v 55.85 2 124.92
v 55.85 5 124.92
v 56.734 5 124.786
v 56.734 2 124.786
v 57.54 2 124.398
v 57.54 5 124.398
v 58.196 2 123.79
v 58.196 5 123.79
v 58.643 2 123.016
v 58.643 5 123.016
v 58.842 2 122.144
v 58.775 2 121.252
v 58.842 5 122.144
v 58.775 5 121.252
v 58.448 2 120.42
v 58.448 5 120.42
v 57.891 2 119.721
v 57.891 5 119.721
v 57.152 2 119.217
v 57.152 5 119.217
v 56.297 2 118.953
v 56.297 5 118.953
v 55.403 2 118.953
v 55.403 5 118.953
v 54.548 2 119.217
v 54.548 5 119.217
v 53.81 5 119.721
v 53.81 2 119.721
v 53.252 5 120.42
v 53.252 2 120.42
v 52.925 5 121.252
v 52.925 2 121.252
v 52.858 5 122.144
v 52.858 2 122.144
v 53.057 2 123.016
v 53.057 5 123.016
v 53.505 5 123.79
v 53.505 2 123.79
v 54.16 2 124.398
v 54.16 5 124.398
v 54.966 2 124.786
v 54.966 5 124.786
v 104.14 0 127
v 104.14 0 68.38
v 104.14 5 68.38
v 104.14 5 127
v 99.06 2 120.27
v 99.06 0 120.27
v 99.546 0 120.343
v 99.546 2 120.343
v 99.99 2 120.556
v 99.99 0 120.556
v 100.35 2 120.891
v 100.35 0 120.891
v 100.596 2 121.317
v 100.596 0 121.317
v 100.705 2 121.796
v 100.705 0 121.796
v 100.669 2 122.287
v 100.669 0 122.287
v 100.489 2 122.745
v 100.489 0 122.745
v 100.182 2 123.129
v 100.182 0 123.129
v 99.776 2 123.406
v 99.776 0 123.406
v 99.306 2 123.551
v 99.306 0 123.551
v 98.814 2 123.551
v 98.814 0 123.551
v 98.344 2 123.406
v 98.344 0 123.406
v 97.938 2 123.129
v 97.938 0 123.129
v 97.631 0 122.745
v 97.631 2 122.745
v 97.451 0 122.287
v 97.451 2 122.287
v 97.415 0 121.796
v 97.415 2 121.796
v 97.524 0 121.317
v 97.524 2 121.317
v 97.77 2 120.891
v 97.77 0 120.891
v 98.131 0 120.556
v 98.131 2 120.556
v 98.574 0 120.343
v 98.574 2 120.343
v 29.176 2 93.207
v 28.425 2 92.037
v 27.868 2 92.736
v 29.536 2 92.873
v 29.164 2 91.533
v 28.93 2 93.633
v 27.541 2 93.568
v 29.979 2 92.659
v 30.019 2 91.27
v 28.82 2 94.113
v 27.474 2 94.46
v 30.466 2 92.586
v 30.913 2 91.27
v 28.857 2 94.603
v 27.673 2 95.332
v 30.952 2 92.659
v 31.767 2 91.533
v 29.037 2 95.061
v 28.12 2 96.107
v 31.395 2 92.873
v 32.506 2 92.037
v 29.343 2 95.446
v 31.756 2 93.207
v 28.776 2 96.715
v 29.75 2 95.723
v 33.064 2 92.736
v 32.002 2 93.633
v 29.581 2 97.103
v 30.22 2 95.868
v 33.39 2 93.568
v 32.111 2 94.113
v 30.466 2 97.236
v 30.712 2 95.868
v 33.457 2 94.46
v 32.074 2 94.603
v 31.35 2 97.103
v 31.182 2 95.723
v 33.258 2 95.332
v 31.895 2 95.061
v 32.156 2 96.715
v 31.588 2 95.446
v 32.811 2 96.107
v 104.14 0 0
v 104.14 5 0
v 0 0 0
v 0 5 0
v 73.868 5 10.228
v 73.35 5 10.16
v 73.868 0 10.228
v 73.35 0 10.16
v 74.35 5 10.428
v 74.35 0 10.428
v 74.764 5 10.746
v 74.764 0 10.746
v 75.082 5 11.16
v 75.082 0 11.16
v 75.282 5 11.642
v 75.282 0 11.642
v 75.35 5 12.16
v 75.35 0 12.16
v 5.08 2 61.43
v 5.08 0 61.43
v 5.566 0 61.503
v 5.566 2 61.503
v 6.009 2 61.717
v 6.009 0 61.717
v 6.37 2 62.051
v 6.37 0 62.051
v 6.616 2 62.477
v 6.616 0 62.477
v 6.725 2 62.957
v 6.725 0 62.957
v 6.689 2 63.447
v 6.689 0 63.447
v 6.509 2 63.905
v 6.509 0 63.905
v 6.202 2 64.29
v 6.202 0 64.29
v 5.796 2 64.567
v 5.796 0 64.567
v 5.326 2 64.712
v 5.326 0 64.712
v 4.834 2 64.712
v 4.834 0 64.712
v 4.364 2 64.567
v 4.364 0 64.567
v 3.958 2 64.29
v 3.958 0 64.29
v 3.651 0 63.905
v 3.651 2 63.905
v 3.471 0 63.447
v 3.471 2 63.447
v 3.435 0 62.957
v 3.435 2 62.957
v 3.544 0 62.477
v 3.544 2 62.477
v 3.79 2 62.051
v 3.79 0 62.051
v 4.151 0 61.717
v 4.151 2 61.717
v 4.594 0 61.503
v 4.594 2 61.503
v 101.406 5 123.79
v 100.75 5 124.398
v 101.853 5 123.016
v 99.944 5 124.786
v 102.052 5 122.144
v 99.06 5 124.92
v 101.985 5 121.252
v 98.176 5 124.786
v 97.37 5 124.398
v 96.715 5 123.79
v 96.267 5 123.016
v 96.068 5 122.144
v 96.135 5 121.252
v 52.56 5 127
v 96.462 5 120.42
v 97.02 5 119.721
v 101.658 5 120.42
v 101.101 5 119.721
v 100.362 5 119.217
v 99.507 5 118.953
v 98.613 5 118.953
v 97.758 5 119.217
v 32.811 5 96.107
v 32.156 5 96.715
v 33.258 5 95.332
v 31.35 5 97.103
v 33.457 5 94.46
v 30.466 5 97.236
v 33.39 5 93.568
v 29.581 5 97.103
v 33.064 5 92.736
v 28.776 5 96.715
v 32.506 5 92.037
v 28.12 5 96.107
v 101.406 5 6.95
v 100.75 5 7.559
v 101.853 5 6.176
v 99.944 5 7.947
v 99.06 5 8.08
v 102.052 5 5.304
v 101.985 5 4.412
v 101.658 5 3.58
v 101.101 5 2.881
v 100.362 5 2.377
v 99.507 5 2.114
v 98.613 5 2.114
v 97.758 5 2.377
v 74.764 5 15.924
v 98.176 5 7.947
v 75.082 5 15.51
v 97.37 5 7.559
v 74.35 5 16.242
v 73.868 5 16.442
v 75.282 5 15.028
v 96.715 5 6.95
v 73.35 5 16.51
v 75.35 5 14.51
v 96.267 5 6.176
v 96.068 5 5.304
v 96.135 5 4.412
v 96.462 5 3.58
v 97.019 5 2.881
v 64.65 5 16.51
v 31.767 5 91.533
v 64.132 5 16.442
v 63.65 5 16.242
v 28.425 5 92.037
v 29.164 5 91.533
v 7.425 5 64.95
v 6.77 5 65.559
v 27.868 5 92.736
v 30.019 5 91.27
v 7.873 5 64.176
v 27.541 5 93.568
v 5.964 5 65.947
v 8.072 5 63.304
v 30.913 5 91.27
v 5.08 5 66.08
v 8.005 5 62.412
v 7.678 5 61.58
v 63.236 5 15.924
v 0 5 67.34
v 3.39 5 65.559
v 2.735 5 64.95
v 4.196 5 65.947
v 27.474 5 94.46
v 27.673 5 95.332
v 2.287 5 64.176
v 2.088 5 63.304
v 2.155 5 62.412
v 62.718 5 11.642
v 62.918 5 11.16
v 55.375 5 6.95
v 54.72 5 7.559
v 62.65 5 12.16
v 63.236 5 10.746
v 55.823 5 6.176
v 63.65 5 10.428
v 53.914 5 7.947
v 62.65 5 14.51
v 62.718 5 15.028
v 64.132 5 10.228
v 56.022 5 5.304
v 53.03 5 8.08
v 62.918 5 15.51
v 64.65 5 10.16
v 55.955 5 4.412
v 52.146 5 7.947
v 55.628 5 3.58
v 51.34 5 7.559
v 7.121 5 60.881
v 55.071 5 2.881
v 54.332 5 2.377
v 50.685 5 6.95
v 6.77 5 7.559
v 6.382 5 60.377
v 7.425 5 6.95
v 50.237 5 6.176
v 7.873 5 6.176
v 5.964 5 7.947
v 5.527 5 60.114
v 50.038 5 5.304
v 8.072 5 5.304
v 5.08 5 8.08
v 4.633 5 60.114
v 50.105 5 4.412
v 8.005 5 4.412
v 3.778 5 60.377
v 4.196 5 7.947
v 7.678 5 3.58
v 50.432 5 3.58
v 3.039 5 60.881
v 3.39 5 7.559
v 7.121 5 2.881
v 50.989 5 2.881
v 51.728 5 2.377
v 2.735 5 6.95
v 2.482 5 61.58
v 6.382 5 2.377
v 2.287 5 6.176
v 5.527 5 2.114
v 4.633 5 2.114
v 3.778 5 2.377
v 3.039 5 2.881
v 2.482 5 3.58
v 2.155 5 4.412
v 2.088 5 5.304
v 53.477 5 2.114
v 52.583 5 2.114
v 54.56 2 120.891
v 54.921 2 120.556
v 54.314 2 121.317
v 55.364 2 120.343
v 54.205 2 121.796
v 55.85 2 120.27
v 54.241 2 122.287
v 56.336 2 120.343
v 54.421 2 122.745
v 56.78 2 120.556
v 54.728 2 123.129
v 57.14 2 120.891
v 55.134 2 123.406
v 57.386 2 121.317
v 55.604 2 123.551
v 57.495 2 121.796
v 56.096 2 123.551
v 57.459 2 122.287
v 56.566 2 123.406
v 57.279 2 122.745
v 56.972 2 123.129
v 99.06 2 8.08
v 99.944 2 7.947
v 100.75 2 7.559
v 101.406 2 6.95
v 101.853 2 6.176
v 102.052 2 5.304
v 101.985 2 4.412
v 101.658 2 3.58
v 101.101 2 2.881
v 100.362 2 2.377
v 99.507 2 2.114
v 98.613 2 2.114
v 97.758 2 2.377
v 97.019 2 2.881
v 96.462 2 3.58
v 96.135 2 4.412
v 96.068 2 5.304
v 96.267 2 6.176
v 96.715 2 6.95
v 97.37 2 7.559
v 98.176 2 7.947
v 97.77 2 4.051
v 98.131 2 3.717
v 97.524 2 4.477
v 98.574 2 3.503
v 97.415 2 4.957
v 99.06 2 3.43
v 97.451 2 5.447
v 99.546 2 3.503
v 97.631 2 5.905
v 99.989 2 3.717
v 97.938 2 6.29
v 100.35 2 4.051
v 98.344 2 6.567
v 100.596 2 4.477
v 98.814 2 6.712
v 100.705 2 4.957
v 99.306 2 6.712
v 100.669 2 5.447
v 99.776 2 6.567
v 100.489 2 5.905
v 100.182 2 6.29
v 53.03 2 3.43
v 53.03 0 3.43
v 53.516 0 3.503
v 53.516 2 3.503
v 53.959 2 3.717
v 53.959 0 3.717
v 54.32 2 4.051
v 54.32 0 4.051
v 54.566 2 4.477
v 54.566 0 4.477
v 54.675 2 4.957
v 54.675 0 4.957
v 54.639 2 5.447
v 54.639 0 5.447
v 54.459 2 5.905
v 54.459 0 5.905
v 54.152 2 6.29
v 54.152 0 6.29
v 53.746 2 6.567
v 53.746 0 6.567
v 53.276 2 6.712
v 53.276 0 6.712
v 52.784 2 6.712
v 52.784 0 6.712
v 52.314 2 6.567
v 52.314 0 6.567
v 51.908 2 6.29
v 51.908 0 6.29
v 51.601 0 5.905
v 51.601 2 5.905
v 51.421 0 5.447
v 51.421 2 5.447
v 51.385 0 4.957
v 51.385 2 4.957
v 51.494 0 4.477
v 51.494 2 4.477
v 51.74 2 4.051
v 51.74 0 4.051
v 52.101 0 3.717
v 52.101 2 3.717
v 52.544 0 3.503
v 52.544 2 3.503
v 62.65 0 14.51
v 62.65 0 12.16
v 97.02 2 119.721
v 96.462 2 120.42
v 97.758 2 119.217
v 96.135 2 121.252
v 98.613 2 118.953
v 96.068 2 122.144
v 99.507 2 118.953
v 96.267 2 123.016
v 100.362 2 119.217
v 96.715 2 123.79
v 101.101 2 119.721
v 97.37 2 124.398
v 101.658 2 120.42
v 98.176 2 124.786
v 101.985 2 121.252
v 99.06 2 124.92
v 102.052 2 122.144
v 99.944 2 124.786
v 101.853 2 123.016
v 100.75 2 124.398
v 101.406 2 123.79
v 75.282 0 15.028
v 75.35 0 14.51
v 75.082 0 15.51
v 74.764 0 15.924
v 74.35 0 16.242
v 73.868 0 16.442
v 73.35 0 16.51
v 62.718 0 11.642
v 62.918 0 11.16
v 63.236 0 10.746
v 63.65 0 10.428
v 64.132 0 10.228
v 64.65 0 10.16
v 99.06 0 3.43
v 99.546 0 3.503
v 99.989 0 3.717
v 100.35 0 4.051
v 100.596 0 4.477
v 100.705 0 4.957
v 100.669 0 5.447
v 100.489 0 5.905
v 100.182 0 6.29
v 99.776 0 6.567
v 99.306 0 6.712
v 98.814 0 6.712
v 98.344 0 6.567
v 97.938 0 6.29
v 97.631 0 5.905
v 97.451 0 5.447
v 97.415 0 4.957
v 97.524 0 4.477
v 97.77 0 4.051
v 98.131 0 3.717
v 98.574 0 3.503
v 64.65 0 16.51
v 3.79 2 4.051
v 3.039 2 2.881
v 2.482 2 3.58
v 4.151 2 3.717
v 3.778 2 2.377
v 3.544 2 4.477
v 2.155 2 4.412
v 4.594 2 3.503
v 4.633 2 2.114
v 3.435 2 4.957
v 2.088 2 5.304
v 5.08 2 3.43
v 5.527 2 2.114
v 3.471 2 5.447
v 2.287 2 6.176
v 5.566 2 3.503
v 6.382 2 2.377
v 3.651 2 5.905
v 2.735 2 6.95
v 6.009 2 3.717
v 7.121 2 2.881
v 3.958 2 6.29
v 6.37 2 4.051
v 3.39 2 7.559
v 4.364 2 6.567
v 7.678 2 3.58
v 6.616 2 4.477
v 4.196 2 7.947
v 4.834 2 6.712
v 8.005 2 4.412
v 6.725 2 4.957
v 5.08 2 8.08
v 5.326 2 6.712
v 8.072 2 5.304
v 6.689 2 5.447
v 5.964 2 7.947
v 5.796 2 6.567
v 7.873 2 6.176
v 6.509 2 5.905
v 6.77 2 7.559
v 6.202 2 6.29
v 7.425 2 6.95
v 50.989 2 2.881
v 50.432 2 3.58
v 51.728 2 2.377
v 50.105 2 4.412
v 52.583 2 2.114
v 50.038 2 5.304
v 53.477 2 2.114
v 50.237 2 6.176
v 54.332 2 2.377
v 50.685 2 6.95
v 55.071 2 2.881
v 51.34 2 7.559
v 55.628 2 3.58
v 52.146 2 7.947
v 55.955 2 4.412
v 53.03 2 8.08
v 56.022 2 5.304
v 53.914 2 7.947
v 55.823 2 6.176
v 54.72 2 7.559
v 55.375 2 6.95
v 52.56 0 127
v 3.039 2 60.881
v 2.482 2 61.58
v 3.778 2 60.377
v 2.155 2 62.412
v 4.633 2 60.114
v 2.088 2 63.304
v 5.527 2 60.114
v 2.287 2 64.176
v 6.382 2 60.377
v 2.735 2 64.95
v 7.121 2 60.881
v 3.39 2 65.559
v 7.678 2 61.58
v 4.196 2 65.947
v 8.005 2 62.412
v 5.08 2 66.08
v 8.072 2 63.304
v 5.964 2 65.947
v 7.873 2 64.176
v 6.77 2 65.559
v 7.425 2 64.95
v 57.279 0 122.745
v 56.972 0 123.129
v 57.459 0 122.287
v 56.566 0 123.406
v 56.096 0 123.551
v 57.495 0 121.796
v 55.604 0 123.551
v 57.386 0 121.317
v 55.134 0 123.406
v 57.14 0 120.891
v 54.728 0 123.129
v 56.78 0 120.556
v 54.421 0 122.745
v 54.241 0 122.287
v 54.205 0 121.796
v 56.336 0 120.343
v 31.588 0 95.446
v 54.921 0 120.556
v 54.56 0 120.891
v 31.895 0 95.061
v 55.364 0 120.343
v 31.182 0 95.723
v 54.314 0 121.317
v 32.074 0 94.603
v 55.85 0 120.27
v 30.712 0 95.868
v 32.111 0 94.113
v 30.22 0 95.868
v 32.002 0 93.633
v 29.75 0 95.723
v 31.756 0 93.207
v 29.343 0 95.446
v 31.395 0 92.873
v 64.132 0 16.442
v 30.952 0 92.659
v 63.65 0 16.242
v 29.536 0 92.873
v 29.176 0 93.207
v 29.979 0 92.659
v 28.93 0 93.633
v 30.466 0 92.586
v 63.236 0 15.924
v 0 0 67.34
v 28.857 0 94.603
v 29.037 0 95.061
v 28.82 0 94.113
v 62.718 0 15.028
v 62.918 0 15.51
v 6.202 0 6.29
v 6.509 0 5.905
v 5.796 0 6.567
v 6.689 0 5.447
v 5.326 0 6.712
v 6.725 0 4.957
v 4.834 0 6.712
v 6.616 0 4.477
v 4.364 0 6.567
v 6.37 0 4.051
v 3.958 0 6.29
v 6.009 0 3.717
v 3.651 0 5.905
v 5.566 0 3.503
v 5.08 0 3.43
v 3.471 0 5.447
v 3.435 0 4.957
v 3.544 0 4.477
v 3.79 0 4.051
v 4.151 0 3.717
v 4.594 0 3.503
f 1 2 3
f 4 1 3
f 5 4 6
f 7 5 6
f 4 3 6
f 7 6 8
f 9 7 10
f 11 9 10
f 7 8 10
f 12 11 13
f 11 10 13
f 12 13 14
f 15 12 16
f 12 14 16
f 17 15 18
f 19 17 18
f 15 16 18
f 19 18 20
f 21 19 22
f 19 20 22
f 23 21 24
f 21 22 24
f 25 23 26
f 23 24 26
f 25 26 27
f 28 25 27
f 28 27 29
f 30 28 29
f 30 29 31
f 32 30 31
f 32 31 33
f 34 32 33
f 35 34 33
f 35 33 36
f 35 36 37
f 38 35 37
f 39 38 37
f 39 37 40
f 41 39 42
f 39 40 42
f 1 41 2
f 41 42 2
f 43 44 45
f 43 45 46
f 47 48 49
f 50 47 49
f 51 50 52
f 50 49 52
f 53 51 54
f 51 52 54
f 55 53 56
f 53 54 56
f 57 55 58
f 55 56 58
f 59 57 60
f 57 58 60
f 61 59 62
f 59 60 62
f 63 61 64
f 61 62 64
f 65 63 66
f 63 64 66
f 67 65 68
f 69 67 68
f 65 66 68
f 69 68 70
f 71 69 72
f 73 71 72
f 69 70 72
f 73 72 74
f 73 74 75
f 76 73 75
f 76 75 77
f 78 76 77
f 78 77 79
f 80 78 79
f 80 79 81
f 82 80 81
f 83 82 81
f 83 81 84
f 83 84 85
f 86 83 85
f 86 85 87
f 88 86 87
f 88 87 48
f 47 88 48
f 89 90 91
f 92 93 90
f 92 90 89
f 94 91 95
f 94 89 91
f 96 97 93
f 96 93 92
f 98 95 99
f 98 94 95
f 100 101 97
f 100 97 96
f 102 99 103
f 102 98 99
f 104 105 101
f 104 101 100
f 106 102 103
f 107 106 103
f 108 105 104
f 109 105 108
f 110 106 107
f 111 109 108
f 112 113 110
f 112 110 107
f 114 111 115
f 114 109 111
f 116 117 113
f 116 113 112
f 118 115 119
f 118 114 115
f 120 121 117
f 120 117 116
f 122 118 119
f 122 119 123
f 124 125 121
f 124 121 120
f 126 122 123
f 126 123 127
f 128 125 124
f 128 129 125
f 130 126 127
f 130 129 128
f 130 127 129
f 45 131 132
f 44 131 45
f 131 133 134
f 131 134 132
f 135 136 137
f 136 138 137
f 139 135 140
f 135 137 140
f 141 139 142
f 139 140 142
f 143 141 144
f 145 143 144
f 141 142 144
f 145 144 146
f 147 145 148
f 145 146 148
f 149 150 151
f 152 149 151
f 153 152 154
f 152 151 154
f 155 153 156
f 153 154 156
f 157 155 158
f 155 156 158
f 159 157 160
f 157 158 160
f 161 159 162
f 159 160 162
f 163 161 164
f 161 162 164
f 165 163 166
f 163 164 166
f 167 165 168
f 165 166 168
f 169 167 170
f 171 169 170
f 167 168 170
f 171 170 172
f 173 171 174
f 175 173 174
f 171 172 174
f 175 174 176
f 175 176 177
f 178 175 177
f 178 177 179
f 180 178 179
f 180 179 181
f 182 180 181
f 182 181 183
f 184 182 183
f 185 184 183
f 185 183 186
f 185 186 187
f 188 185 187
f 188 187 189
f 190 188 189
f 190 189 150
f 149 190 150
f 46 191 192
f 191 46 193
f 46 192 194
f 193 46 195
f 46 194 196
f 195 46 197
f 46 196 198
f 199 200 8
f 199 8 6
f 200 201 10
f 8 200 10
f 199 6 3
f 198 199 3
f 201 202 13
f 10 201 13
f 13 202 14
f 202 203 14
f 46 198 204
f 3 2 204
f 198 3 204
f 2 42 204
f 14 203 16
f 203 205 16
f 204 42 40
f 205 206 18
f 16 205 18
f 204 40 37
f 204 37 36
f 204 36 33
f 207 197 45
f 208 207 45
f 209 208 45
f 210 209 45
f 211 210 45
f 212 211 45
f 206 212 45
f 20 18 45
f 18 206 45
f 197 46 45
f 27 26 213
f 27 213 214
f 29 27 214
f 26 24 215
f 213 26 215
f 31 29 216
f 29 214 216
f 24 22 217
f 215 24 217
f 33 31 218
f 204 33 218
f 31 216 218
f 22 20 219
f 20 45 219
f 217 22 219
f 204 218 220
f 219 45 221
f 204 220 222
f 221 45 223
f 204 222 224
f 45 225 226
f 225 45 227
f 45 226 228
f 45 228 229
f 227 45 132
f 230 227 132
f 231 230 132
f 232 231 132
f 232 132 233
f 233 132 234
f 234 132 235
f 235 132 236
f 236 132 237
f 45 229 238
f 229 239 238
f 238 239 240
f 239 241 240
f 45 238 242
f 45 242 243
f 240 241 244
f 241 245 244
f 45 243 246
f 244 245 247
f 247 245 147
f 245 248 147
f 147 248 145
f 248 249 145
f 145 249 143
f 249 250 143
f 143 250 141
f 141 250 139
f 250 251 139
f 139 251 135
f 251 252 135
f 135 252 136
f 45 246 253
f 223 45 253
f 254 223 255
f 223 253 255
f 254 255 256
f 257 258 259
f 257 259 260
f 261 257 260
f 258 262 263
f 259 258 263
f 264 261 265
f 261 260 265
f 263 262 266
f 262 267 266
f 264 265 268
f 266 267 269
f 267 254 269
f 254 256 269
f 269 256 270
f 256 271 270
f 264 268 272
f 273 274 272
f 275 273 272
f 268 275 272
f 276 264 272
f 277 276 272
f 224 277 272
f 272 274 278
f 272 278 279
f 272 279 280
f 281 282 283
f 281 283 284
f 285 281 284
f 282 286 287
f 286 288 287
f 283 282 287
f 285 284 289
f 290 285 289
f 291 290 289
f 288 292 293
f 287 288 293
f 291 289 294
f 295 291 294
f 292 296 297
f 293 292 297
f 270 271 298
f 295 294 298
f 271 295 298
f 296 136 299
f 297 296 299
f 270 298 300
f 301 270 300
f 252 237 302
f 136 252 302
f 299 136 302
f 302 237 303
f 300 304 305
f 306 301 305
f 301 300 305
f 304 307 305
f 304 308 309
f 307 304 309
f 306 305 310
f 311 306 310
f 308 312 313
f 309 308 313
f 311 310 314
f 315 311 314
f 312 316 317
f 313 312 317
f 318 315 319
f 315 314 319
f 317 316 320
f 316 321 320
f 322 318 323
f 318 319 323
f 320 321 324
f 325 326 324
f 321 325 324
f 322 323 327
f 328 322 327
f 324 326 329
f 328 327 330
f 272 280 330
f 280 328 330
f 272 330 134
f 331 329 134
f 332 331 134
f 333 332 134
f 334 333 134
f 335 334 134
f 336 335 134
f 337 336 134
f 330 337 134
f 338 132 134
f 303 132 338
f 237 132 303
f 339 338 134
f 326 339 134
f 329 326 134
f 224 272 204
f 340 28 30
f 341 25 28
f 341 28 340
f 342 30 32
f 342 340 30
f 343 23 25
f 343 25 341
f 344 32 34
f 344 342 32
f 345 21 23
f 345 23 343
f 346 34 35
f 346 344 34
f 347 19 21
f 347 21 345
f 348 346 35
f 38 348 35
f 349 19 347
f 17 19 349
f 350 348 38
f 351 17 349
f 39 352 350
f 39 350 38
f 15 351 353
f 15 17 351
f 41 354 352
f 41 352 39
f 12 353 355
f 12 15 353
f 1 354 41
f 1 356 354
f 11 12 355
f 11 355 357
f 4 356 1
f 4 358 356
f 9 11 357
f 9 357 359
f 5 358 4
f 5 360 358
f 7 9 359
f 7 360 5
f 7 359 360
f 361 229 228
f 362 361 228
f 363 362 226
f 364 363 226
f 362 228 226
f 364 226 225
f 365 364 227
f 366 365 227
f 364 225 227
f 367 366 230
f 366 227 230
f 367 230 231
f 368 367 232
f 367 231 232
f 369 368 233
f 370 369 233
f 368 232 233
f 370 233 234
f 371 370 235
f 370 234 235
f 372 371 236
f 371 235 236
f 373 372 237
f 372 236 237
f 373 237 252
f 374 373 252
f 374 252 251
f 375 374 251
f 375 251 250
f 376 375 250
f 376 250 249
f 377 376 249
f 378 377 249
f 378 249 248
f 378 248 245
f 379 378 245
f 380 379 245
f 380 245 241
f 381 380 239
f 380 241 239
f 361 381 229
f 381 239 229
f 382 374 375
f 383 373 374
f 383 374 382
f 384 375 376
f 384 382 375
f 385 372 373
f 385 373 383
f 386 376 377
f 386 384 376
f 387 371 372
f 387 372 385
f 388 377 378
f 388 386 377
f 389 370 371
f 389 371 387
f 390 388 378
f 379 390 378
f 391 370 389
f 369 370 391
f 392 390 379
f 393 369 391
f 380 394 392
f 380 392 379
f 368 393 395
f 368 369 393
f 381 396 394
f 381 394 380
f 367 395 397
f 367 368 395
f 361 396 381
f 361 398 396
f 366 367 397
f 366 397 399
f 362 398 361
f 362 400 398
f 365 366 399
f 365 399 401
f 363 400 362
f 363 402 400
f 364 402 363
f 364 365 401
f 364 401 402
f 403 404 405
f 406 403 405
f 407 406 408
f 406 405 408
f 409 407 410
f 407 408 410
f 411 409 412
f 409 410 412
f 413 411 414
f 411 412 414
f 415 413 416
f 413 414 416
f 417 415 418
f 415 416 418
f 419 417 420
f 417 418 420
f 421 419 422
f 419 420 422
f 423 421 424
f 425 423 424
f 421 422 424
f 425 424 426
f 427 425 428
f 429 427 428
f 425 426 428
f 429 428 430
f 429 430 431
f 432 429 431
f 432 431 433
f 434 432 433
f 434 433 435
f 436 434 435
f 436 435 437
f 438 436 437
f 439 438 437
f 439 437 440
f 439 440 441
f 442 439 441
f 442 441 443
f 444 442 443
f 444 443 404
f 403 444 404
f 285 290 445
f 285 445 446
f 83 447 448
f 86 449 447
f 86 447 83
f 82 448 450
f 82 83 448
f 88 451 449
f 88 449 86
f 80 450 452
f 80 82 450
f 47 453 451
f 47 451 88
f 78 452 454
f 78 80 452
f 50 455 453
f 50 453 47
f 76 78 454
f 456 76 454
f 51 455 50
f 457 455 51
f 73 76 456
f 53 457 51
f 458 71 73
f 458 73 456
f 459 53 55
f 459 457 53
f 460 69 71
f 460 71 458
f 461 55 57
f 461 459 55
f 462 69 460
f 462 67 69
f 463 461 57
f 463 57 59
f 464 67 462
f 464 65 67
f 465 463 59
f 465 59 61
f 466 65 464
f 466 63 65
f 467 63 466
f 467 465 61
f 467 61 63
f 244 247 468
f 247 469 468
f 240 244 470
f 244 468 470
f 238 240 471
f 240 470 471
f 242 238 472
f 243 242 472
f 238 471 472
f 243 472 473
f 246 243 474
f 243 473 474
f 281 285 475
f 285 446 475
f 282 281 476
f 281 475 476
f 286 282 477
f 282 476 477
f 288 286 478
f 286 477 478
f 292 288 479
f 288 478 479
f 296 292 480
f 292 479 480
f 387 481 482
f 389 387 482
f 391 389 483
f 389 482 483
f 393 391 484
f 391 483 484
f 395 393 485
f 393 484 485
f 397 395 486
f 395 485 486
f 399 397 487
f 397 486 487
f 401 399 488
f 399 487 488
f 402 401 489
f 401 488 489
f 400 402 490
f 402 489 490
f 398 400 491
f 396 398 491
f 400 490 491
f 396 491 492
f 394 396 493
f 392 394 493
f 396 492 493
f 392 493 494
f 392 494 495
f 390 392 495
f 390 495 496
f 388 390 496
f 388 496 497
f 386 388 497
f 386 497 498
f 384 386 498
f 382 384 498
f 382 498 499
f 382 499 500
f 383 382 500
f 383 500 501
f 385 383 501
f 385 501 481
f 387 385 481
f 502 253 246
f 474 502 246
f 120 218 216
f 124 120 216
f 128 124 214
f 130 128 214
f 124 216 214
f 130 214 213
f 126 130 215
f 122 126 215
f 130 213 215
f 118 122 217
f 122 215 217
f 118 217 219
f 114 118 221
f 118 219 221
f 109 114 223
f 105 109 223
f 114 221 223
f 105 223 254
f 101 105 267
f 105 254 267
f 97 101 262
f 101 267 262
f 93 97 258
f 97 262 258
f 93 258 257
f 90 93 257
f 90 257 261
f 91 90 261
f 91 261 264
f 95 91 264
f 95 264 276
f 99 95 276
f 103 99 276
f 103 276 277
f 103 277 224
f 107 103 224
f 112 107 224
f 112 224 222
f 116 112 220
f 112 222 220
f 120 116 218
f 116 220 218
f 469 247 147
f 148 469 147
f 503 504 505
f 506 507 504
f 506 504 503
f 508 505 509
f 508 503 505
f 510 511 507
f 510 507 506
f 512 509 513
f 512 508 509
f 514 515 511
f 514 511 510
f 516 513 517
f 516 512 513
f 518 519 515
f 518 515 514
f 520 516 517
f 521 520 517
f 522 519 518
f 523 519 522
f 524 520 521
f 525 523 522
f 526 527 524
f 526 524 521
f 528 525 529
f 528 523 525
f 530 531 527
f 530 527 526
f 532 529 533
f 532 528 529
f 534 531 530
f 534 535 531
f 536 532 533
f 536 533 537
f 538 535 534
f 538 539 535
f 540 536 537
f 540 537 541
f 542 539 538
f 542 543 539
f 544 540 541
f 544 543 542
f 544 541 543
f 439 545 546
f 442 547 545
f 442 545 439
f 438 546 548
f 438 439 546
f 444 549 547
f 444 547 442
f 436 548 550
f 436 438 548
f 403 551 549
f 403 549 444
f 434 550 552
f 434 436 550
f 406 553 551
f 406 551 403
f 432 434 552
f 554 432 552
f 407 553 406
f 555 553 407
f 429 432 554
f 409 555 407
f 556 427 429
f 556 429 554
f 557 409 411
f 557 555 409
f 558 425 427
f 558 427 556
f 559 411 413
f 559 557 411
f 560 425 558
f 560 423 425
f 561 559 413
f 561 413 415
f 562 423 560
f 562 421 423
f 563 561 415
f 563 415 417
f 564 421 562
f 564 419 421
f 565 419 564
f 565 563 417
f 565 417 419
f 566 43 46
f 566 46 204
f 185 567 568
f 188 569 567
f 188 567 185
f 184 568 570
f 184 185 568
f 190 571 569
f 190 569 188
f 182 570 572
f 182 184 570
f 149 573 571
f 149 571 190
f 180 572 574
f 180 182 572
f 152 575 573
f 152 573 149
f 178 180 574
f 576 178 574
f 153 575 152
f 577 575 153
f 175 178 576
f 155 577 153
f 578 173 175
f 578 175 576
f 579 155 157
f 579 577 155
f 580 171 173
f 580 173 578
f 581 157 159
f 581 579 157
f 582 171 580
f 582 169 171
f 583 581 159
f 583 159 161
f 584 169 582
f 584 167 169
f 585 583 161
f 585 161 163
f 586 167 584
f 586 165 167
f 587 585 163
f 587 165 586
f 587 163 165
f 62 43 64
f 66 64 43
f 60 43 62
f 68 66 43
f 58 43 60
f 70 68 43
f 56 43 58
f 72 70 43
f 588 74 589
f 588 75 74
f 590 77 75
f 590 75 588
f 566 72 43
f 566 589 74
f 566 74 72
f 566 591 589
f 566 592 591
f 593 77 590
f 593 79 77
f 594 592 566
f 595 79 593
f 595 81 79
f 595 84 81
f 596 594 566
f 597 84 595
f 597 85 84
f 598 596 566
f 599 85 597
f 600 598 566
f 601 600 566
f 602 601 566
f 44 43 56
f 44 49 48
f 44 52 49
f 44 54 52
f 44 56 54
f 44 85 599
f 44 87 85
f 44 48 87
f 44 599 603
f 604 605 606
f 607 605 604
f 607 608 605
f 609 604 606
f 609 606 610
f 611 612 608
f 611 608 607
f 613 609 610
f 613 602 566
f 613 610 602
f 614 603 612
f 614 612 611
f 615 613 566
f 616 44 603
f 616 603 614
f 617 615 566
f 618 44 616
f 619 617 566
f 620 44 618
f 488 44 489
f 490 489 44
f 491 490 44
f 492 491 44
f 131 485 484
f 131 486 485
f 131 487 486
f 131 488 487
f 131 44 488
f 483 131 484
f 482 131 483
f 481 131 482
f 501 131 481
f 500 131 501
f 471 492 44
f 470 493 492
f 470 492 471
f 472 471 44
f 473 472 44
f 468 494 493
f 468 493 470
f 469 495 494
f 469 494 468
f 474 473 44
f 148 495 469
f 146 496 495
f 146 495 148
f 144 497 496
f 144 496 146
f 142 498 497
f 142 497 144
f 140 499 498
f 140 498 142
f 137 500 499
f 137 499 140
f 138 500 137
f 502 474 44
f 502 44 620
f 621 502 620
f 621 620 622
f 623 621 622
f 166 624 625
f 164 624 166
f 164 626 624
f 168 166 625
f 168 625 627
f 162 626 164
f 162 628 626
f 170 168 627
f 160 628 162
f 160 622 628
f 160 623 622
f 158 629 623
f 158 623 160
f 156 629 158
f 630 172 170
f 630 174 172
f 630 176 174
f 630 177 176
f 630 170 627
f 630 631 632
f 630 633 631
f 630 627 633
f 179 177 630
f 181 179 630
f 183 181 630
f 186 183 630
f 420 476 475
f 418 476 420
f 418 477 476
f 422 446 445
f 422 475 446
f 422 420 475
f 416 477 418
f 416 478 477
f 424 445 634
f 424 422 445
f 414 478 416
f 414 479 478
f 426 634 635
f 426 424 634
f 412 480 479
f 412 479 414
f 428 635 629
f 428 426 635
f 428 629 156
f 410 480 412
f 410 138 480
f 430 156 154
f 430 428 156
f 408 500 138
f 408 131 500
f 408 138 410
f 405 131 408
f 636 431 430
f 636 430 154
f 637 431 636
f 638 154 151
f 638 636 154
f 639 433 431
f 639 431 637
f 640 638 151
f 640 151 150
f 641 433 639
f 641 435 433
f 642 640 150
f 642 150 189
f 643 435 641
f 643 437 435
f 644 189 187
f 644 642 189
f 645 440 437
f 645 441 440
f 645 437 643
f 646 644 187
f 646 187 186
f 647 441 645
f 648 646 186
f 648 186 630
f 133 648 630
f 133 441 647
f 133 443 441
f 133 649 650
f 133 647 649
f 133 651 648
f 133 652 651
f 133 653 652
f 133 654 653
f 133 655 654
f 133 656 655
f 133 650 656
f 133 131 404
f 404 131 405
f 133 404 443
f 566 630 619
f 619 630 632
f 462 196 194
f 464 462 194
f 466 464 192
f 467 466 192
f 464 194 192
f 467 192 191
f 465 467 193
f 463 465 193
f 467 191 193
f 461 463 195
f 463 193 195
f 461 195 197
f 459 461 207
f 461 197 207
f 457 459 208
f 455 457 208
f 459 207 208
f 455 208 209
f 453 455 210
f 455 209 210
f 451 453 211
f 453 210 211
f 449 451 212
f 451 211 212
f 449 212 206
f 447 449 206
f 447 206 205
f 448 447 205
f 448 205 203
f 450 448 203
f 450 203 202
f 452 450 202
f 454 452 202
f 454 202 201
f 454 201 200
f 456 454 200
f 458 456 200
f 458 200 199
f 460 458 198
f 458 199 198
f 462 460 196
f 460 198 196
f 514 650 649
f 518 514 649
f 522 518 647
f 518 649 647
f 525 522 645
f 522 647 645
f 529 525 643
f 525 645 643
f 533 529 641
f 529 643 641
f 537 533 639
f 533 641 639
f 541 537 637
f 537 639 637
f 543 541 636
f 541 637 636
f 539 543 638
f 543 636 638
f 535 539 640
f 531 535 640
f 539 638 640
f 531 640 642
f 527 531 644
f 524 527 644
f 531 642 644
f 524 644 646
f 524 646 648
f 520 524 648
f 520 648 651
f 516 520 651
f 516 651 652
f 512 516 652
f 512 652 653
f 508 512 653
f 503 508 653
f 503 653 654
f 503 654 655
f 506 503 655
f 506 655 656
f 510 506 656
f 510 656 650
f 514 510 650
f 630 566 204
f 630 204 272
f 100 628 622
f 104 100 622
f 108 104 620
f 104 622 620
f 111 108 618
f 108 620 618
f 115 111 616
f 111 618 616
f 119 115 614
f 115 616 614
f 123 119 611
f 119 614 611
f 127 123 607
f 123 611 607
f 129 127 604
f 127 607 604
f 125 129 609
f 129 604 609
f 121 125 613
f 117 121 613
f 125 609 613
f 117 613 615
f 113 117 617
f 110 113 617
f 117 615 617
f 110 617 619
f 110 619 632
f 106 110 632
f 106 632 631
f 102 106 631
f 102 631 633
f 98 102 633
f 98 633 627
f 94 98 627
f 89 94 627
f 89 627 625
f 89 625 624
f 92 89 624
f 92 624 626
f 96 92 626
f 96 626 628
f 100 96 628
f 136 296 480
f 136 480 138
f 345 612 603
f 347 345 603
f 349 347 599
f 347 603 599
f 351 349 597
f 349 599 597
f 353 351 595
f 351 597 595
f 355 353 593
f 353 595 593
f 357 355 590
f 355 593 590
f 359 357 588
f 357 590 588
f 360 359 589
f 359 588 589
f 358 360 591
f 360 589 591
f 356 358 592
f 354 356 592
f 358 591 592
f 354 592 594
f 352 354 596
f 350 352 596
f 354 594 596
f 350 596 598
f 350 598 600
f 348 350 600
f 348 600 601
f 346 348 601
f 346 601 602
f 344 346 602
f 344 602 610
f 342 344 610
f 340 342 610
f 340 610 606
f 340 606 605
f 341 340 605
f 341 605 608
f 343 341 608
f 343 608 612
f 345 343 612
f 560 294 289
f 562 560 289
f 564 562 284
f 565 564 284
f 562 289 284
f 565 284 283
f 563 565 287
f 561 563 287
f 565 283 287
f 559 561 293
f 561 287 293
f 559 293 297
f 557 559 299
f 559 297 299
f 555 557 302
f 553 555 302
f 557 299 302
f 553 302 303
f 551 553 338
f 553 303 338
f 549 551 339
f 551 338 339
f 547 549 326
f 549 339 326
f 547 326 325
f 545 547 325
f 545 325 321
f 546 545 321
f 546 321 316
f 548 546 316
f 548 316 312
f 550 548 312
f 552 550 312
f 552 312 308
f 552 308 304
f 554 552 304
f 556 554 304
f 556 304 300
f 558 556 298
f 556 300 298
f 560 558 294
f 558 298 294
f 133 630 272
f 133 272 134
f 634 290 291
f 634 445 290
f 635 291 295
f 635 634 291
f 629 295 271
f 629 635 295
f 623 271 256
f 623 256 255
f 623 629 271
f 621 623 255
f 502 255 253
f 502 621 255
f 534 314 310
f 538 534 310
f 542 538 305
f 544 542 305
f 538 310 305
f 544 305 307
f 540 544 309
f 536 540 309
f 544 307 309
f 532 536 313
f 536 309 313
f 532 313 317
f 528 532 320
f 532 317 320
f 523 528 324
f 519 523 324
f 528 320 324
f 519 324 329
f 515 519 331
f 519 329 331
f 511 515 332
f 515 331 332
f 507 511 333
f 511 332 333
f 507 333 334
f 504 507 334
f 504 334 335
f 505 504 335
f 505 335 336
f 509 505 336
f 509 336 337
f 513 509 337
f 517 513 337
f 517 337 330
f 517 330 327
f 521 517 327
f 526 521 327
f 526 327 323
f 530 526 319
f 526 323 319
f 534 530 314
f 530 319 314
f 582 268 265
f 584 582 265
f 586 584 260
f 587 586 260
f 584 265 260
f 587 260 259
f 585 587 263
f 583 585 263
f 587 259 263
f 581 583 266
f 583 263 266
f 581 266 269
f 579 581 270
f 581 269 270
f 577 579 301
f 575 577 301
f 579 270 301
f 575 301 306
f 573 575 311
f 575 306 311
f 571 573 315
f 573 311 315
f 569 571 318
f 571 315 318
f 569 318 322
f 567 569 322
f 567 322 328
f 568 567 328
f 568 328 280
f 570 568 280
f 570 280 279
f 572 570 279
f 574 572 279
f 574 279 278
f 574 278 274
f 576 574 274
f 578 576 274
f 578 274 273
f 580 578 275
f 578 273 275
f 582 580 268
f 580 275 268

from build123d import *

# Parameters (mm, degrees)
BOSS_EXTRUDE1_DEPTH   = 5
F_4_0MM_DOWEL_HOLE1_D = 3.3
SKETCH4_W             = 12.7
SKETCH4_H             = 6.35
CUT_EXTRUDE1_DEPTH    = 5
FILLET1_R             = 2
SKETCH5_R             = 3
CUT_EXTRUDE2_DEPTH    = 3


with BuildPart() as part:
    # Sketch1 → Boss-Extrude1 (new body)
    with BuildSketch(Plane(origin=(0, 0, 0), x_dir=(1, 0, 0), z_dir=(0, 1, 0))):
        Polygon((0, 0), (104.14, 0), (104.140084457, -68.379681711), (104.140084457, -126.999681711), (52.560084457, -126.999681711), (0, -67.34), align=None)
    extrude(amount=BOSS_EXTRUDE1_DEPTH)

    # Ø4.0mm Dowel Hole1 (through all)
    with Locations(Plane(origin=(5.08, 5, 5.08), x_dir=(0, 0, 1), z_dir=(0, 1, 0))):
        with Locations((0, 0), (0, 47.95), (0, 93.980006274), (116.839681711, 93.980084457), (116.839681711, 50.770084457), (89.156056724, 25.385630403), (58, 0)):
            Hole(F_4_0MM_DOWEL_HOLE1_D / 2)

    # Sketch4 → Cut-Extrude1 (cut)
    with BuildSketch(Plane(origin=(0, 5, 0), x_dir=(1, 0, 0), z_dir=(0, 1, 0))):
        with Locations((69, -13.335)):
            Rectangle(SKETCH4_W, SKETCH4_H)
    extrude(amount=-CUT_EXTRUDE1_DEPTH, mode=Mode.SUBTRACT)

    # Fillet1
    fillet1_edges = [part.edges().sort_by_distance(p)[0] for p in [
        (62.65, 2.5, 10.16),
        (62.65, 2.5, 16.51),
        (75.35, 2.5, 16.51),
        (75.35, 2.5, 10.16),
    ]]
    fillet(fillet1_edges, radius=FILLET1_R)

    # Sketch5 → Cut-Extrude2 (cut)
    with BuildSketch(Plane(origin=(0, 5, 0), x_dir=(1, 0, 0), z_dir=(0, 1, 0))):
        with Locations(Location((55.850084457, -121.919681711, 0), (0, 0, 270))):
            Circle(SKETCH5_R)
        with Locations(Location((99.060084457, -121.919681711, 0), (0, 0, 270))):
            Circle(SKETCH5_R)
        with Locations(Location((30.465630403, -94.236056724, 0), (0, 0, 270))):
            Circle(SKETCH5_R)
        with Locations(Location((5.08, -63.08, 0), (0, 0, 270))):
            Circle(SKETCH5_R)
        with Locations(Location((5.08, -5.08, 0), (0, 0, 270))):
            Circle(SKETCH5_R)
        with Locations(Location((53.03, -5.08, 0), (0, 0, 270))):
            Circle(SKETCH5_R)
        with Locations(Location((99.060006274, -5.08, 0), (0, 0, 270))):
            Circle(SKETCH5_R)
    extrude(amount=-CUT_EXTRUDE2_DEPTH, mode=Mode.SUBTRACT)


solid = part.part
